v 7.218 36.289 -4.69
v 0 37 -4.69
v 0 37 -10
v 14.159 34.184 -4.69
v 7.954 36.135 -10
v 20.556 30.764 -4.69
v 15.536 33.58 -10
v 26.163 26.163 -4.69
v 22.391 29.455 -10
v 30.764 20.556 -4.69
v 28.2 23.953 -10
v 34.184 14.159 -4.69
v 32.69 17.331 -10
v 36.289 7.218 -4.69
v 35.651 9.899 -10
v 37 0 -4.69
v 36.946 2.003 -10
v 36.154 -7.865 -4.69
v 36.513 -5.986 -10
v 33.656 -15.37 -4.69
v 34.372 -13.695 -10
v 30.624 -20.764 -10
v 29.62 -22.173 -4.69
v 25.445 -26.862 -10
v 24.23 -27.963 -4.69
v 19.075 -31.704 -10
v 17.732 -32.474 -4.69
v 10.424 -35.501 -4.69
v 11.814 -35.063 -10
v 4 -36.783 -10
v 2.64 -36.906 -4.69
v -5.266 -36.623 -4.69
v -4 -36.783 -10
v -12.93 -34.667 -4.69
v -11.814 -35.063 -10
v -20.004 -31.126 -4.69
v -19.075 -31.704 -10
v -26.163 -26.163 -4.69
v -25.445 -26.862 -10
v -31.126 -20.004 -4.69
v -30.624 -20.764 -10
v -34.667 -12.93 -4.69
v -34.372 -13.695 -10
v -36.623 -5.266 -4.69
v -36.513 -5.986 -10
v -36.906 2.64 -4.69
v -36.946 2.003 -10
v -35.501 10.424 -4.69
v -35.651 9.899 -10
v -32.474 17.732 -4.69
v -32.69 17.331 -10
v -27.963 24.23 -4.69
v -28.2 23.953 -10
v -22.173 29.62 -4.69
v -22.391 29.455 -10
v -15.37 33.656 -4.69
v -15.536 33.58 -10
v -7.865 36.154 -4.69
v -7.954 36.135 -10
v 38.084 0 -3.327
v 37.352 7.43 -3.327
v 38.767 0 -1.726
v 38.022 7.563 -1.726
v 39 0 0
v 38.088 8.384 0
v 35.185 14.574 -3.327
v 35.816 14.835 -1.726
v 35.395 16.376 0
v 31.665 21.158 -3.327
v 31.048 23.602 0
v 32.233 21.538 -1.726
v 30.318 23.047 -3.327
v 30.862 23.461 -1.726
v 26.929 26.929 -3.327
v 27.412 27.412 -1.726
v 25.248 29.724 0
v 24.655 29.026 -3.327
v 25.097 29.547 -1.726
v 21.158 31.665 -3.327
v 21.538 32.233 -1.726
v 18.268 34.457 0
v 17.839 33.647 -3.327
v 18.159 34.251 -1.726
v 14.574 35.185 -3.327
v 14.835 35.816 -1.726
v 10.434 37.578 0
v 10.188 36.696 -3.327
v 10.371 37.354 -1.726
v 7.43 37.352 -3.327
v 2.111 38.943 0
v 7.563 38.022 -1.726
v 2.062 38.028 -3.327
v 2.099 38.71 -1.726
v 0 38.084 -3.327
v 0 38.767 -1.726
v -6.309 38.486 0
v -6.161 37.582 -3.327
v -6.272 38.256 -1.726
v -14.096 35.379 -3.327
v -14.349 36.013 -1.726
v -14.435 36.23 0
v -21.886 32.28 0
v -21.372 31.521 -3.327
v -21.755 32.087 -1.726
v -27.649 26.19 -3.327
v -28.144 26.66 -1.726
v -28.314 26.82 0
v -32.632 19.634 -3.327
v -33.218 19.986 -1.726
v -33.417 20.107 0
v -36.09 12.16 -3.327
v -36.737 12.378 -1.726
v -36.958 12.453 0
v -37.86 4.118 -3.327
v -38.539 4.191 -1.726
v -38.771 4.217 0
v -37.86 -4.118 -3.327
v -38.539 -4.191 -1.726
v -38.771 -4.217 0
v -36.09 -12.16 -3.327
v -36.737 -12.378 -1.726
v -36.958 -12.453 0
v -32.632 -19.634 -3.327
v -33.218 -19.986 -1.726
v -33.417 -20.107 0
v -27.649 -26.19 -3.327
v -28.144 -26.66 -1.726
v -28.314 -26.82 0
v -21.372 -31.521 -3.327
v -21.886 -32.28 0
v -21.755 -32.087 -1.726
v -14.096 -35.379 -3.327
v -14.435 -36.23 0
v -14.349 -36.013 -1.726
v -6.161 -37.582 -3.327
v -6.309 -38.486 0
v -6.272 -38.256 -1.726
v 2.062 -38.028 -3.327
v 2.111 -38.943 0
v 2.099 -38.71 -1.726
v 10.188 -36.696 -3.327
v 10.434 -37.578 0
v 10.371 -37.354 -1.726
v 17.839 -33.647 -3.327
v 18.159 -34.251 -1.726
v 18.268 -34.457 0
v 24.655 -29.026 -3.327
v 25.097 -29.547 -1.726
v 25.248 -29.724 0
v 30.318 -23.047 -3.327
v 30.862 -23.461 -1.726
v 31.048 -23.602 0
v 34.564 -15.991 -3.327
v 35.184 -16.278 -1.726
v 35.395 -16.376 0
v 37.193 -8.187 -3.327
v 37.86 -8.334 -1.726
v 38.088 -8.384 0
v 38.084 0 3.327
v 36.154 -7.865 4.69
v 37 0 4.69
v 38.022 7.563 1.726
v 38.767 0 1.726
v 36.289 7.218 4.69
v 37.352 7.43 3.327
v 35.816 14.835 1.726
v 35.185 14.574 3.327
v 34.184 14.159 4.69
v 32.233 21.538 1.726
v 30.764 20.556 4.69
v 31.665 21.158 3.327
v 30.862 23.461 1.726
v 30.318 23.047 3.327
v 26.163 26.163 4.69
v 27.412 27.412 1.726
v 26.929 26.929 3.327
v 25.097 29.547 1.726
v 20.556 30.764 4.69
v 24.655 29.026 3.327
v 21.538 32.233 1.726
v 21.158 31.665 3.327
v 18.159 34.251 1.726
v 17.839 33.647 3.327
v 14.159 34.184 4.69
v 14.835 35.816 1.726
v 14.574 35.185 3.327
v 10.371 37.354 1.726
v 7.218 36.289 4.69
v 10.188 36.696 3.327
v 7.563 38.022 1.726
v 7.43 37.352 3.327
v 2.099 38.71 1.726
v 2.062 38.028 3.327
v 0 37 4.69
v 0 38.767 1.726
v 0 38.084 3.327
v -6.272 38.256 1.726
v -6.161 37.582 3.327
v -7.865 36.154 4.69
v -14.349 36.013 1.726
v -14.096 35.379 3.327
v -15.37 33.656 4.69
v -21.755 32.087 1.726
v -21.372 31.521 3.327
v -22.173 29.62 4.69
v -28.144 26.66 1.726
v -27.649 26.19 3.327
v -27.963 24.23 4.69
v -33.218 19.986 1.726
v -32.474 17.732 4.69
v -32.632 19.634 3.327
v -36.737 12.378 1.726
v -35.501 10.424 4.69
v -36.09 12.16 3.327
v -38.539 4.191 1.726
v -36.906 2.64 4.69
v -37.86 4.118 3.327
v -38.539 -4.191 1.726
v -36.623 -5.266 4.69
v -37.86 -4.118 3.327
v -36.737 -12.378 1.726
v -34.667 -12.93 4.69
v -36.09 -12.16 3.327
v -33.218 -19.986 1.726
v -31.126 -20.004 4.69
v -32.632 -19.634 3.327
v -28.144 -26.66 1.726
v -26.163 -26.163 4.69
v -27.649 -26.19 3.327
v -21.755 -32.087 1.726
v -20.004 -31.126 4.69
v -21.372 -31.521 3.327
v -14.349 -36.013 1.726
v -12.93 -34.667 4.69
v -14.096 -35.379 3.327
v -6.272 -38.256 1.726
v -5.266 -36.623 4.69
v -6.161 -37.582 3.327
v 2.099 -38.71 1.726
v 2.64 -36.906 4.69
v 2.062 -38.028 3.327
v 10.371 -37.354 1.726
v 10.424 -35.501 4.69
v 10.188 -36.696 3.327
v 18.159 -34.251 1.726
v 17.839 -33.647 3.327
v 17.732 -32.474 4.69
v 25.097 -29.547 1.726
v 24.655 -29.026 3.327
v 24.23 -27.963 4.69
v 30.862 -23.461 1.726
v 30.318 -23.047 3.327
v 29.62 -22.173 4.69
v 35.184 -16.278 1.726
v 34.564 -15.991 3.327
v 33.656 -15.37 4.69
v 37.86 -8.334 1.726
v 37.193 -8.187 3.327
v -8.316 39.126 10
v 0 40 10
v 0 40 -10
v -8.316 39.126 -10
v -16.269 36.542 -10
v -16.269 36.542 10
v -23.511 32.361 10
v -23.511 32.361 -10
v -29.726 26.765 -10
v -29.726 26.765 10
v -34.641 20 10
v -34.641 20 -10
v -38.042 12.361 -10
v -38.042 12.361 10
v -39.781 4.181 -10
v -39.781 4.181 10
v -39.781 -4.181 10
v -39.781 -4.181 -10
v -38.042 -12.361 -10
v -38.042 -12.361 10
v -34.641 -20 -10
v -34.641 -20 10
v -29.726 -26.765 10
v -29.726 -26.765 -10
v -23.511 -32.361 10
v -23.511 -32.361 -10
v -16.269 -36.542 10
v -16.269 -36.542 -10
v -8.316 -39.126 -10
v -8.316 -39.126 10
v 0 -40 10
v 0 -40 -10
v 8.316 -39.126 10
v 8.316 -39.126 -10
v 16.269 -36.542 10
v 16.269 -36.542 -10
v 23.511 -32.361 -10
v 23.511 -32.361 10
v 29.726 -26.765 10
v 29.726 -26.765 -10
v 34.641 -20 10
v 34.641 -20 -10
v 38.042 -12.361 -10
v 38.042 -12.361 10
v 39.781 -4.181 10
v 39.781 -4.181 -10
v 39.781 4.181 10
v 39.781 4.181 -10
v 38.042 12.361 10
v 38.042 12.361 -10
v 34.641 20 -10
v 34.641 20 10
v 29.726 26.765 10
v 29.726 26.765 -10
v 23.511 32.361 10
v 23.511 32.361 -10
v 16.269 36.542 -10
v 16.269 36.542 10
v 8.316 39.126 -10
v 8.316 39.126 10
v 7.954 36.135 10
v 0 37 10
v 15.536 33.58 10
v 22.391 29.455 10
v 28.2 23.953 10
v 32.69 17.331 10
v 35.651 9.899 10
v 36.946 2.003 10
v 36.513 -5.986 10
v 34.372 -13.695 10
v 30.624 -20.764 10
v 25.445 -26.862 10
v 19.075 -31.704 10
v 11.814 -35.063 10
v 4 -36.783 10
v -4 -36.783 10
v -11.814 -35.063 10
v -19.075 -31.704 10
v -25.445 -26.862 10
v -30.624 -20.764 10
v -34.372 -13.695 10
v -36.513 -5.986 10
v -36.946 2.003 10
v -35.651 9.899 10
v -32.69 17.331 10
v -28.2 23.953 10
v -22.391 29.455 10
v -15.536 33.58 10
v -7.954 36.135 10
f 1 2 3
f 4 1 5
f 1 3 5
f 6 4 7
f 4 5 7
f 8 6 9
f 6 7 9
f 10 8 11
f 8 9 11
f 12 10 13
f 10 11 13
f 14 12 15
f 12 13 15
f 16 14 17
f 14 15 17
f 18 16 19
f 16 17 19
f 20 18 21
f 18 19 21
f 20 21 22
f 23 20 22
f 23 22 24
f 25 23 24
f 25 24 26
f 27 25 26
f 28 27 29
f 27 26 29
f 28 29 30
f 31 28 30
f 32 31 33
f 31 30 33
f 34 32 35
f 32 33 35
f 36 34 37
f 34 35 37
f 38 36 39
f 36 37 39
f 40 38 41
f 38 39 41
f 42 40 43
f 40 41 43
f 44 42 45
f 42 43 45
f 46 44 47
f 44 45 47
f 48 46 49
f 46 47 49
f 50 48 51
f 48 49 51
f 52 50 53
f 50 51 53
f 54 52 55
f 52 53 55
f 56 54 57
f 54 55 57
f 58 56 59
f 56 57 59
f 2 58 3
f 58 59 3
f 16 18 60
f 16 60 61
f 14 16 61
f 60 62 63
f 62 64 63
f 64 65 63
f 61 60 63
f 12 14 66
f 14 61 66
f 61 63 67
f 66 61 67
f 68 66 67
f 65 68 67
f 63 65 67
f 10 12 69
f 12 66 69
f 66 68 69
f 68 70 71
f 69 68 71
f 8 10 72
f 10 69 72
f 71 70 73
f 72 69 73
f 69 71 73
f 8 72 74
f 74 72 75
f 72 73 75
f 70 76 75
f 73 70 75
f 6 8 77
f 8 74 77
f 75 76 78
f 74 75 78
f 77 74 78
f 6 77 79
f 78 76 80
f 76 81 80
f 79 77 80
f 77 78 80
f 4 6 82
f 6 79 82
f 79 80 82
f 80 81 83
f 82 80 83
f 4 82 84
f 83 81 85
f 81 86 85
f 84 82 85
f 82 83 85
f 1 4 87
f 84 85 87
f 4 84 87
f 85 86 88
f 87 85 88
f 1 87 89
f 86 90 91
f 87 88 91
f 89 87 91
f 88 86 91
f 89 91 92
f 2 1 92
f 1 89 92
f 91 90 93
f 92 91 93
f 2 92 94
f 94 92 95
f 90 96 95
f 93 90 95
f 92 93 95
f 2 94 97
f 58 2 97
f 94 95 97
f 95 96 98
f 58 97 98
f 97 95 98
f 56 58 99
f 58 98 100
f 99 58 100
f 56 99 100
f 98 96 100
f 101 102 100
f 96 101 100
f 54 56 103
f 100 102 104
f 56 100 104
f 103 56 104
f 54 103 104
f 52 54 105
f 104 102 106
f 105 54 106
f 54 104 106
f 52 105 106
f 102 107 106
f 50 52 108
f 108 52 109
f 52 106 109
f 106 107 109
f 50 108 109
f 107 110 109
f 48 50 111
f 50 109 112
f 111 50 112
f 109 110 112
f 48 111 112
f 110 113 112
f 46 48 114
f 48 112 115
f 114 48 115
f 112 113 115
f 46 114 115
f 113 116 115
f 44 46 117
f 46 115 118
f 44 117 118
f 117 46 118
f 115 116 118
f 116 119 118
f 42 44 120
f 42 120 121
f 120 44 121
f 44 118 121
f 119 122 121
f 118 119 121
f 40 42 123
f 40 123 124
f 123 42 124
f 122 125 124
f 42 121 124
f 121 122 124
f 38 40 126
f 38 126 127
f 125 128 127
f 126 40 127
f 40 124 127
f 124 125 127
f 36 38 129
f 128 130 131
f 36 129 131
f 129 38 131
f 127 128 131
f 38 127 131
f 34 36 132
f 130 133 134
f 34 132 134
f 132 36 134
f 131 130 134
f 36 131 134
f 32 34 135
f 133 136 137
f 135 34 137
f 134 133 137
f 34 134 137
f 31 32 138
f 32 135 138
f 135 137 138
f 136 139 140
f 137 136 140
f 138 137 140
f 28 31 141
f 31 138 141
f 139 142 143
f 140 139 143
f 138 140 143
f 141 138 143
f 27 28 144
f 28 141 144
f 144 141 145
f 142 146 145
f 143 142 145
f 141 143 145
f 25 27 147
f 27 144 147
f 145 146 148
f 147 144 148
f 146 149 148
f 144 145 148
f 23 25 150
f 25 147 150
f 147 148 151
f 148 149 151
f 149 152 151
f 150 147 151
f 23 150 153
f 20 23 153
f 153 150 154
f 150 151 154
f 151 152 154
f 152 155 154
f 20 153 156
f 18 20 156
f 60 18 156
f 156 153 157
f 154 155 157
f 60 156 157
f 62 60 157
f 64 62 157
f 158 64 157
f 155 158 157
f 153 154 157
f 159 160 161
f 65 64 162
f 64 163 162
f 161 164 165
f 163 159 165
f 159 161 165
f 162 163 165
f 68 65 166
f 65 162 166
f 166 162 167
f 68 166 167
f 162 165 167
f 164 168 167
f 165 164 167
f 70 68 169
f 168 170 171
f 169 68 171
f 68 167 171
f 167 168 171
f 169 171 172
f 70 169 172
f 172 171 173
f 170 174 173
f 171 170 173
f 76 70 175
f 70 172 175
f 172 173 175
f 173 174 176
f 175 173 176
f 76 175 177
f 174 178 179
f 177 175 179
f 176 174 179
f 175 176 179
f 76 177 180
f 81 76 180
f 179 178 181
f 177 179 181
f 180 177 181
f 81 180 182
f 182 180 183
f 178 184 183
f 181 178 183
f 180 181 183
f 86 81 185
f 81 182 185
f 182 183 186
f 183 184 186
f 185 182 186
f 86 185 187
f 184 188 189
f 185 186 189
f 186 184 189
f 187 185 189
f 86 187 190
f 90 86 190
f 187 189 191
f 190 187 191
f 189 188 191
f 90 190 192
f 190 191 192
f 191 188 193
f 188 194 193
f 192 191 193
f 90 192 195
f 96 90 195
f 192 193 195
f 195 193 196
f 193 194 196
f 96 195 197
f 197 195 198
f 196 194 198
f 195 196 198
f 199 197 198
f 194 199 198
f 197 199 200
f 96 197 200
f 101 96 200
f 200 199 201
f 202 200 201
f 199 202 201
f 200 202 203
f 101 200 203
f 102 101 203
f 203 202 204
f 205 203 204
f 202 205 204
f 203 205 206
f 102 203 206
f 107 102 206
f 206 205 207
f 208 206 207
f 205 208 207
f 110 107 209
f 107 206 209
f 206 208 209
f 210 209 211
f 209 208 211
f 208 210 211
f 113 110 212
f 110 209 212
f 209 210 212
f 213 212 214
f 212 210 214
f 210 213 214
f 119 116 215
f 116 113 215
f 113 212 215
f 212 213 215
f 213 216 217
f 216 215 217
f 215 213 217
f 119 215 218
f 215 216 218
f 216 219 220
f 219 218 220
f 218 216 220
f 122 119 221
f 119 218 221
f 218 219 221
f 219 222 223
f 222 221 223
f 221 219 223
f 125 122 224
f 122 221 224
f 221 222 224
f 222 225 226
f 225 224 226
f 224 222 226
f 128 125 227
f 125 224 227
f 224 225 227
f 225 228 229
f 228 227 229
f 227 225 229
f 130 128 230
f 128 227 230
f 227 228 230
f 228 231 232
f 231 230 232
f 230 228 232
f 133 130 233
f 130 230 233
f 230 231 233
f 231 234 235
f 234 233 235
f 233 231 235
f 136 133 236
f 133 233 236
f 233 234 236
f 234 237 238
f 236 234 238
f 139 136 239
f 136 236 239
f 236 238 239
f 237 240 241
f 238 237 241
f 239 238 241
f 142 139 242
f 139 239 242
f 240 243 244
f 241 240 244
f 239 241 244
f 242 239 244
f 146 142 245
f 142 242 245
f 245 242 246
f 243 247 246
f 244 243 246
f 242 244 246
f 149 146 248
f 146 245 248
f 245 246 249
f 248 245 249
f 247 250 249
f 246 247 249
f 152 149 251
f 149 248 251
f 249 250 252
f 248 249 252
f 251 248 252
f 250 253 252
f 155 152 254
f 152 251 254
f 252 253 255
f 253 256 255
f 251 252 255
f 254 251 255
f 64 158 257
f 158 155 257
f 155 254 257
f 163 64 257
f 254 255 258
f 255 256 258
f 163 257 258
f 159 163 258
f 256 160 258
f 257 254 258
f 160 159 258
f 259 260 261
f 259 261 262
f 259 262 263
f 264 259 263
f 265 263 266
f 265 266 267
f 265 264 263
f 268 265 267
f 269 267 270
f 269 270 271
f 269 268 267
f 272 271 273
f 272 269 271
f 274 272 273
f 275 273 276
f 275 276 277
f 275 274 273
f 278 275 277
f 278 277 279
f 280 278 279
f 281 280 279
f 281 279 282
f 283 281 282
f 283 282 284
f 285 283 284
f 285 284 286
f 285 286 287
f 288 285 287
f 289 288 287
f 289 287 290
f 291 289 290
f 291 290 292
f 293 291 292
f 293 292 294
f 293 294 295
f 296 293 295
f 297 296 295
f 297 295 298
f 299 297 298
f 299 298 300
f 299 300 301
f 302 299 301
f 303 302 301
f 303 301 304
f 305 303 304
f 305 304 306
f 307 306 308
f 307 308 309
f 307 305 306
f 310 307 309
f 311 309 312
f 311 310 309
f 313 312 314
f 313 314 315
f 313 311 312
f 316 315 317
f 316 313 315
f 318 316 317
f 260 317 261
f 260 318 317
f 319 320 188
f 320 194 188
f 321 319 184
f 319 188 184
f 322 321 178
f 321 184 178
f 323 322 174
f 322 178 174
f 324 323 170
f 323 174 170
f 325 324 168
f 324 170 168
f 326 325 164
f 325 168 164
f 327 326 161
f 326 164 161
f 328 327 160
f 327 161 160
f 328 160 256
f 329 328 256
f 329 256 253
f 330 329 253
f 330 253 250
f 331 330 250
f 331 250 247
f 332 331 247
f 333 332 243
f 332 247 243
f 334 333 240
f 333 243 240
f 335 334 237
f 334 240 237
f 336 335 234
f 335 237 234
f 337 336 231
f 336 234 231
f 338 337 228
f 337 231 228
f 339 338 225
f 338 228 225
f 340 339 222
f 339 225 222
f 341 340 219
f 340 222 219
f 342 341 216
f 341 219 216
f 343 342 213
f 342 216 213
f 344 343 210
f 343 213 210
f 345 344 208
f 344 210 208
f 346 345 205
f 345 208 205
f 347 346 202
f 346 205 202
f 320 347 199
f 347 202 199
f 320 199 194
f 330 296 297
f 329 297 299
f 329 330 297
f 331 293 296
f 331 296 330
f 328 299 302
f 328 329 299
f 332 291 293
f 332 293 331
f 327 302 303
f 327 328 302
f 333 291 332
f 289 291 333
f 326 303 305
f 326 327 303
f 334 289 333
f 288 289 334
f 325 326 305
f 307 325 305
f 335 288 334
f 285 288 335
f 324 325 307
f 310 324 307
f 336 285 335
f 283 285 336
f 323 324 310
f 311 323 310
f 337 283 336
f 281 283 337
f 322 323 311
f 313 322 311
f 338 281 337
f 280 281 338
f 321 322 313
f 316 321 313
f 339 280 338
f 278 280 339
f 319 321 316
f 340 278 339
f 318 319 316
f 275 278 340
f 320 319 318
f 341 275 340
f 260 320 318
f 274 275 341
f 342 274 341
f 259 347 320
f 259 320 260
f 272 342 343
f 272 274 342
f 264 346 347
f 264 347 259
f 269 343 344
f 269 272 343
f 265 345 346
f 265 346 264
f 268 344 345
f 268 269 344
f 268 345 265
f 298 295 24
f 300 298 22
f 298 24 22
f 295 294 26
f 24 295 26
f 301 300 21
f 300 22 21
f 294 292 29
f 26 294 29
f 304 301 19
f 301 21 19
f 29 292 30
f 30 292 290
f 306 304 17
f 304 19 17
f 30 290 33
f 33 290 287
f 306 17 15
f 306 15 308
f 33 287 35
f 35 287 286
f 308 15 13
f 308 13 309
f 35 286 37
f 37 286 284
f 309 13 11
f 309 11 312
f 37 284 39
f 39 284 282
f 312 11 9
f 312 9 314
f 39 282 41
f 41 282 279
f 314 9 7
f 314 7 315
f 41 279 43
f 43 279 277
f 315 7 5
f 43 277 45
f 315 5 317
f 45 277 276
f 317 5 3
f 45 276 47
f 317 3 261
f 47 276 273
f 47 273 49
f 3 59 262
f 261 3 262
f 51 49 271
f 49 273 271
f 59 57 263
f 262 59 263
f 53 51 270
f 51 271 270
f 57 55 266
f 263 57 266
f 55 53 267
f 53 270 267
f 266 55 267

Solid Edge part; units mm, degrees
sketch "Sketch1" plane through (0, 0, 0) normal (1, 0, 0) x (0, 1, 0)
  line L0 (37, 10) -> (37, -10)
  line L1 (37, -10) -> (40, -10)
  line L2 (40, -10) -> (40, 10)
  line L3 (37, 10) -> (40, 10)
  dimension "D1" = 3
  dimension "D2" = 20
revolve "RevolvedProtrusion1" add sketch "Sketch1" angle 360 about axis through (0, 0, -57) along (0, 0, 1)
sketch "Sketch2" plane through (0, 0, 0) normal (0, -1, 0) x (1, 0, 0)
  circle A0 centre (32.5, 0) radius 6.5
  dimension "D1" = 13
revolve "RevolvedCutout1" cut sketch "Sketch2" angle 360 about axis through (0, 0, 54) along (0, 0, -1)
properties material "Polyethylene, low density"
